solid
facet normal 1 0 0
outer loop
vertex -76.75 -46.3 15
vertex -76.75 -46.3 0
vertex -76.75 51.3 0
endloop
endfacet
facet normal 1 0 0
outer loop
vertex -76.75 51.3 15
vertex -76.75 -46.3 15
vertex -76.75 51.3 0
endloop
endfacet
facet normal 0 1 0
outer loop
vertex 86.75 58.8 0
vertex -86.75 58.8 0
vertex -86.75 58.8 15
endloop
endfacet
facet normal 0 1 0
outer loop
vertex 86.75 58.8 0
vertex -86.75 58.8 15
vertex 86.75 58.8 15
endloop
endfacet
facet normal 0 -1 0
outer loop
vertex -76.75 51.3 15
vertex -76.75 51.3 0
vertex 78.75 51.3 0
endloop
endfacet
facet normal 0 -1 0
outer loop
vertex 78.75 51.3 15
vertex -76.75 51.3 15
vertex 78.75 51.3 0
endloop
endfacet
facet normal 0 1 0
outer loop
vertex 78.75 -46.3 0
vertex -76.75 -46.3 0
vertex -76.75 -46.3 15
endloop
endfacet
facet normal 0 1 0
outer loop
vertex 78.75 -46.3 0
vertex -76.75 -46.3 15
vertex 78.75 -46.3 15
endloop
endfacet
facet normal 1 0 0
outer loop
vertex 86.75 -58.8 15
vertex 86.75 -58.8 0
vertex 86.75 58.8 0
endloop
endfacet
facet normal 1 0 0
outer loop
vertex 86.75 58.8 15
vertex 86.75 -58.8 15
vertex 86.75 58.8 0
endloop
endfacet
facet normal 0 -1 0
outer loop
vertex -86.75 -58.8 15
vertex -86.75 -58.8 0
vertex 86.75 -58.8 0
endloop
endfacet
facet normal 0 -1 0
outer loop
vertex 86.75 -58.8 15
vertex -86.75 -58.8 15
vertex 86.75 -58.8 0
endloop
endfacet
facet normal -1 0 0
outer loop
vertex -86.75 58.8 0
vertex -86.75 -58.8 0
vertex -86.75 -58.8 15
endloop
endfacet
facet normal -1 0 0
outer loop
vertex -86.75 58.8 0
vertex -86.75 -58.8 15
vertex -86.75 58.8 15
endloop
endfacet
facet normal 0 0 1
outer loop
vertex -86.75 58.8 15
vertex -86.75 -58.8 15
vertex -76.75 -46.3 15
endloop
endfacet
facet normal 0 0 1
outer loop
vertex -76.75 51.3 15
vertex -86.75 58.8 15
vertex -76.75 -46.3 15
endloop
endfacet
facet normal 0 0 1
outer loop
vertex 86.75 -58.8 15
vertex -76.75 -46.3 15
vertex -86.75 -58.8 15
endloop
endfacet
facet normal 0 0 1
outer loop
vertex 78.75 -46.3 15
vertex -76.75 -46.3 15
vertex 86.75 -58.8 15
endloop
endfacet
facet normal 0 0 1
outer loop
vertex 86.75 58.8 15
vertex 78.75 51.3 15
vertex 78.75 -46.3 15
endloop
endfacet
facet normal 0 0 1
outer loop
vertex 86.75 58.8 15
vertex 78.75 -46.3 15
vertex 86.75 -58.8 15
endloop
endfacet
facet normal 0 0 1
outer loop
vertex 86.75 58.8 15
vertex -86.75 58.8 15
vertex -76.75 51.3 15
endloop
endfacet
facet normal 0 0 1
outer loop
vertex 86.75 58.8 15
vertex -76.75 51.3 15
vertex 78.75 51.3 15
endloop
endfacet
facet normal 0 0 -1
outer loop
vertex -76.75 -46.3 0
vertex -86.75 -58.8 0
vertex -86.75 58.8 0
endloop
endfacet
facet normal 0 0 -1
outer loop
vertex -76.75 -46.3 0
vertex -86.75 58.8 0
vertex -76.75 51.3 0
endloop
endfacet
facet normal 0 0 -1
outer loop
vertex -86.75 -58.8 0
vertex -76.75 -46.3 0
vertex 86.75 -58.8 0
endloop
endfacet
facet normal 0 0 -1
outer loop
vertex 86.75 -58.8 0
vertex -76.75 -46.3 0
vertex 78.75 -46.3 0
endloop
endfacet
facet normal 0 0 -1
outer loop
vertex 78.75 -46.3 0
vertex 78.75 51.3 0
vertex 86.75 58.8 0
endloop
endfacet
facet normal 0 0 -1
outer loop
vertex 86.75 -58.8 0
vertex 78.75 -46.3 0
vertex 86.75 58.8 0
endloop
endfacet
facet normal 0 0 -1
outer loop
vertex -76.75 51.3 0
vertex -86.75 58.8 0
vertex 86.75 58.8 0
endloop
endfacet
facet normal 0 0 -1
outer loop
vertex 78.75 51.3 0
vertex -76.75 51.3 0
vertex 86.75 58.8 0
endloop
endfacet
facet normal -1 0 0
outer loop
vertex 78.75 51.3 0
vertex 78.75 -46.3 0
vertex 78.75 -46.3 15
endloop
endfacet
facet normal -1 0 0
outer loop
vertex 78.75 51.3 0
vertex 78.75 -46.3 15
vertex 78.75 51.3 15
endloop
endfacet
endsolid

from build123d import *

# Parameters (mm, degrees)
F3_W     = 173.5
F3_H     = 117.6
F4_DEPTH = 15
F2_W     = 155.5
F2_H     = 97.6
F5_DEPTH = 15
F1_W     = 161.5
F1_H     = 105.6
F6_DEPTH = 13


with BuildPart() as f4:
    # F3 (on face) → F4 (new body)
    with BuildSketch(Plane.XY):
        Rectangle(F3_W, F3_H)
    extrude(amount=F4_DEPTH)

    # F2 (on face) → F5 (cut)
    with BuildSketch(Plane.XY):
        with Locations((1, 2.5)):
            Rectangle(F2_W, F2_H)
    extrude(amount=F5_DEPTH, mode=Mode.SUBTRACT)

    # F1 (on Top) → F6 (cut)
    with BuildSketch(Plane.XY):
        Rectangle(F1_W, F1_H)
    extrude(amount=-F6_DEPTH, mode=Mode.SUBTRACT)


solid = f4.part
